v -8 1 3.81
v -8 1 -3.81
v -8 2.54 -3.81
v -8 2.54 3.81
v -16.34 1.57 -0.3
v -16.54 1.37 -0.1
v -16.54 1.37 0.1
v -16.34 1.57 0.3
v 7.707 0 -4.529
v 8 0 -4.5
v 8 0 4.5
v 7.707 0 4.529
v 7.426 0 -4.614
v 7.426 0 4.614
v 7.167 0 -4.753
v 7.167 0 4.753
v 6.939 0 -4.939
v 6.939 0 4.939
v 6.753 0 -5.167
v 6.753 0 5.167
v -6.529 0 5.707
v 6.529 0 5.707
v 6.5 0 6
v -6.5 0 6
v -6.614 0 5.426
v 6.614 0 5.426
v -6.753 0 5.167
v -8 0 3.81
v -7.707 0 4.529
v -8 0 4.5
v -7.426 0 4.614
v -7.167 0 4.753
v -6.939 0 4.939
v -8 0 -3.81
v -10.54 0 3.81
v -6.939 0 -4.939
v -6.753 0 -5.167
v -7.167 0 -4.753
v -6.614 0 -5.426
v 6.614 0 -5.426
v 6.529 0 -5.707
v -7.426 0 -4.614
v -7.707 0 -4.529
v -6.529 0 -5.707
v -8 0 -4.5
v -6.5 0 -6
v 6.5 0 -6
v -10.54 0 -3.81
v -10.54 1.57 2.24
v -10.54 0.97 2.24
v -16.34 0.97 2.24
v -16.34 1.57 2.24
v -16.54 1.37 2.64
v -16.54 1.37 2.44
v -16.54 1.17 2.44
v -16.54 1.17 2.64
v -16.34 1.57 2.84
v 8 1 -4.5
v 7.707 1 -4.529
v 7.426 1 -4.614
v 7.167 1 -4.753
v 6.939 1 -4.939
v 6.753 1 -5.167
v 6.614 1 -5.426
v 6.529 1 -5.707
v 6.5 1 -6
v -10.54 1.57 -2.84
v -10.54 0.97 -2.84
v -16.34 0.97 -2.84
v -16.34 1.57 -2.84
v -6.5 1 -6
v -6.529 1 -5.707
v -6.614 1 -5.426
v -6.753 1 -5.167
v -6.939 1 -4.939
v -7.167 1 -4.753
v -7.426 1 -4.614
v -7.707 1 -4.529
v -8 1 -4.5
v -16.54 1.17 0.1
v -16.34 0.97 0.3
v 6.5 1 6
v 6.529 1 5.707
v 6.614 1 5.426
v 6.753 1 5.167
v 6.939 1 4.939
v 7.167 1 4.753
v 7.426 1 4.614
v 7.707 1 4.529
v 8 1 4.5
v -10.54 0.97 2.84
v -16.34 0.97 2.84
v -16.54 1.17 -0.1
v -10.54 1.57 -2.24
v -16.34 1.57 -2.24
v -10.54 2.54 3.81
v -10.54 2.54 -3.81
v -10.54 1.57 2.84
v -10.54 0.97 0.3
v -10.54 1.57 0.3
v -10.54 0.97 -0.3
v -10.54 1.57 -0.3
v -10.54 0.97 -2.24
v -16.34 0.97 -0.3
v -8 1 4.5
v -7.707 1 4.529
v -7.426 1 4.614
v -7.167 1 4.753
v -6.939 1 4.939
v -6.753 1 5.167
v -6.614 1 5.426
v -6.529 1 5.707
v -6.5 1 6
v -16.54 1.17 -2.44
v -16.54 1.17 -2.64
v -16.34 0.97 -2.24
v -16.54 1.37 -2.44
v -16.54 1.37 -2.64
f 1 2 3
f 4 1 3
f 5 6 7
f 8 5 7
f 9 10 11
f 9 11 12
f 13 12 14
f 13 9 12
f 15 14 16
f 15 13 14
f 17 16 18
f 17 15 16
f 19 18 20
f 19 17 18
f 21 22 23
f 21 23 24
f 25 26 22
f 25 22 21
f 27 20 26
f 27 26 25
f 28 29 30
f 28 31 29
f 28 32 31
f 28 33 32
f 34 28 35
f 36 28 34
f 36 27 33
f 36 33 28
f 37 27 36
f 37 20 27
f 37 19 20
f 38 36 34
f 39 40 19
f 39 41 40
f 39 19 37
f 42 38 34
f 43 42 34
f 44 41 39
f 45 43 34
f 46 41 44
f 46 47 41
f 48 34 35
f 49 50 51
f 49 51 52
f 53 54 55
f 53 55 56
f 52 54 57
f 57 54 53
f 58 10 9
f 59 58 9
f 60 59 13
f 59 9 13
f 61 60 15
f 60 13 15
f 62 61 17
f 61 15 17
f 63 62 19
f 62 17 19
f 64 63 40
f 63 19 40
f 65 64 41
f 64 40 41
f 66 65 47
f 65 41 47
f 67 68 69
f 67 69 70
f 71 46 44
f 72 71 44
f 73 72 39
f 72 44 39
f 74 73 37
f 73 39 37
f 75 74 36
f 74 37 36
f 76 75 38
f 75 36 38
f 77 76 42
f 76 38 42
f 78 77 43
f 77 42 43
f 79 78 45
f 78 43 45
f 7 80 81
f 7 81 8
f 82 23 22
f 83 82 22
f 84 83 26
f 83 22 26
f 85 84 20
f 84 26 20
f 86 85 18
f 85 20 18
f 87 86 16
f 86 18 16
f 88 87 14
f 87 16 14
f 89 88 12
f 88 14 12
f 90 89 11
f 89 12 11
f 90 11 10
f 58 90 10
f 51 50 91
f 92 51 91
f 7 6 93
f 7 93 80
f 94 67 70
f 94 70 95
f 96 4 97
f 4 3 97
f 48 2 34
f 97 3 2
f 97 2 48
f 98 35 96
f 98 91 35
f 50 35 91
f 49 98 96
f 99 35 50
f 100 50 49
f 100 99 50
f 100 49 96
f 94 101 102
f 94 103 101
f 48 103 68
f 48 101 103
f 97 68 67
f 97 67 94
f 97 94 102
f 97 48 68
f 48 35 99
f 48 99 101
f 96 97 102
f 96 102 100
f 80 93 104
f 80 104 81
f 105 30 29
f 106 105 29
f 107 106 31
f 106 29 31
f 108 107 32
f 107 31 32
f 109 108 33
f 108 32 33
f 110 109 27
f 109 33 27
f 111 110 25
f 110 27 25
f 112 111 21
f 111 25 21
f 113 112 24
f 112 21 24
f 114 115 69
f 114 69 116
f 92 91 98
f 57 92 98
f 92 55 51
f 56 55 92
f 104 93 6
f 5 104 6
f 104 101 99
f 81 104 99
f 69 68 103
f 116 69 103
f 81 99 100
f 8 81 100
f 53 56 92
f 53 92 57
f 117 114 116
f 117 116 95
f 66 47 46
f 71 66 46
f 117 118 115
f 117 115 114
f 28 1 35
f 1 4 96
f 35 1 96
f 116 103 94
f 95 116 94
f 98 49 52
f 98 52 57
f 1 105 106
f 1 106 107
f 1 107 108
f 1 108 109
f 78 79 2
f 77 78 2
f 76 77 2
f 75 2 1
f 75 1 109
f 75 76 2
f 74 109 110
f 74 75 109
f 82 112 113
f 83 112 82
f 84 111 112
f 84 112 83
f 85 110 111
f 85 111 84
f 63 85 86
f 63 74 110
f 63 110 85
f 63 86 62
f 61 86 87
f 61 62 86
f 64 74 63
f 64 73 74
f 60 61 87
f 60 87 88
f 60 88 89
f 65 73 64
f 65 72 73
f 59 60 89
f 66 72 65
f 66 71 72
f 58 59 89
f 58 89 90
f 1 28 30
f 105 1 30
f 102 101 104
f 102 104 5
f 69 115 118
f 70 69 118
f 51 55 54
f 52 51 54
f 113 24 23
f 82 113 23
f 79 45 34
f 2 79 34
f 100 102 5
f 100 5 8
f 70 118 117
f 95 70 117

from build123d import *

# Parameters (mm, degrees)
BOSS_EXTRU_1_DEPTH = 1
ESQUISSE2_W        = 2.54
ESQUISSE2_H        = 2.54
BOSS_EXTRU_2_DEPTH = 3.81
ESQUISSE3_W        = 0.6
ESQUISSE3_H        = 0.6
BOSS_EXTRU_3_DEPTH = 6
CHANFREIN1_SIZE    = 0.2


with BuildPart() as part:
    # Esquisse1 → Boss.-Extru.1 (new body)
    with BuildSketch(Plane(origin=(0, 0, 0), x_dir=(1, 0, 0), z_dir=(0, 1, 0))):
        with BuildLine():
            Line((-6.5, -6), (6.5, -6))
            ThreePointArc((6.5, -6), (6.939339828, -4.939339828), (8, -4.5))
            Line((8, -4.5), (8, 4.5))
            ThreePointArc((8, 4.5), (6.939339828, 4.939339828), (6.5, 6))
            Line((6.5, 6), (-6.5, 6))
            ThreePointArc((-6.5, 6), (-6.939339828, 4.939339828), (-8, 4.5))
            Line((-8, 4.5), (-8, -4.5))
            ThreePointArc((-8, -4.5), (-6.939339828, -4.939339828), (-6.5, -6))
        make_face()
    extrude(amount=BOSS_EXTRU_1_DEPTH)

    # Esquisse2 → Boss.-Extru.2 (add, symmetric)
    with BuildSketch(Plane(origin=(0, 0, 0), x_dir=(-1, 0, 0), z_dir=(0, 0, -1))):
        with Locations((9.27, 1.27)):
            Rectangle(ESQUISSE2_W, ESQUISSE2_H)
    extrude(amount=BOSS_EXTRU_2_DEPTH, both=True)

    # Esquisse3 → Boss.-Extru.3 (add)
    with BuildSketch(Plane.ZY.offset(10.54)):
        with Locations((-2.54, 1.27)):
            Rectangle(ESQUISSE3_W, ESQUISSE3_H)
        with Locations((0, 1.27)):
            Rectangle(ESQUISSE3_W, ESQUISSE3_H)
        with Locations((2.54, 1.27)):
            Rectangle(ESQUISSE3_W, ESQUISSE3_H)
    extrude(amount=BOSS_EXTRU_3_DEPTH)

    # Chanfrein1
    chanfrein1_edges = [part.edges().sort_by_distance(p)[0] for p in [
        (-16.54, 1.27, -2.84),
        (-16.54, 0.97, -2.54),
        (-16.54, 1.27, -2.24),
        (-16.54, 1.57, -2.54),
        (-16.54, 1.27, -0.3),
        (-16.54, 0.97, 0),
        (-16.54, 1.27, 0.3),
        (-16.54, 1.57, 0),
        (-16.54, 1.27, 2.24),
        (-16.54, 0.97, 2.54),
        (-16.54, 1.27, 2.84),
        (-16.54, 1.57, 2.54),
    ]]
    chamfer(chanfrein1_edges, length=CHANFREIN1_SIZE)


solid = part.part
